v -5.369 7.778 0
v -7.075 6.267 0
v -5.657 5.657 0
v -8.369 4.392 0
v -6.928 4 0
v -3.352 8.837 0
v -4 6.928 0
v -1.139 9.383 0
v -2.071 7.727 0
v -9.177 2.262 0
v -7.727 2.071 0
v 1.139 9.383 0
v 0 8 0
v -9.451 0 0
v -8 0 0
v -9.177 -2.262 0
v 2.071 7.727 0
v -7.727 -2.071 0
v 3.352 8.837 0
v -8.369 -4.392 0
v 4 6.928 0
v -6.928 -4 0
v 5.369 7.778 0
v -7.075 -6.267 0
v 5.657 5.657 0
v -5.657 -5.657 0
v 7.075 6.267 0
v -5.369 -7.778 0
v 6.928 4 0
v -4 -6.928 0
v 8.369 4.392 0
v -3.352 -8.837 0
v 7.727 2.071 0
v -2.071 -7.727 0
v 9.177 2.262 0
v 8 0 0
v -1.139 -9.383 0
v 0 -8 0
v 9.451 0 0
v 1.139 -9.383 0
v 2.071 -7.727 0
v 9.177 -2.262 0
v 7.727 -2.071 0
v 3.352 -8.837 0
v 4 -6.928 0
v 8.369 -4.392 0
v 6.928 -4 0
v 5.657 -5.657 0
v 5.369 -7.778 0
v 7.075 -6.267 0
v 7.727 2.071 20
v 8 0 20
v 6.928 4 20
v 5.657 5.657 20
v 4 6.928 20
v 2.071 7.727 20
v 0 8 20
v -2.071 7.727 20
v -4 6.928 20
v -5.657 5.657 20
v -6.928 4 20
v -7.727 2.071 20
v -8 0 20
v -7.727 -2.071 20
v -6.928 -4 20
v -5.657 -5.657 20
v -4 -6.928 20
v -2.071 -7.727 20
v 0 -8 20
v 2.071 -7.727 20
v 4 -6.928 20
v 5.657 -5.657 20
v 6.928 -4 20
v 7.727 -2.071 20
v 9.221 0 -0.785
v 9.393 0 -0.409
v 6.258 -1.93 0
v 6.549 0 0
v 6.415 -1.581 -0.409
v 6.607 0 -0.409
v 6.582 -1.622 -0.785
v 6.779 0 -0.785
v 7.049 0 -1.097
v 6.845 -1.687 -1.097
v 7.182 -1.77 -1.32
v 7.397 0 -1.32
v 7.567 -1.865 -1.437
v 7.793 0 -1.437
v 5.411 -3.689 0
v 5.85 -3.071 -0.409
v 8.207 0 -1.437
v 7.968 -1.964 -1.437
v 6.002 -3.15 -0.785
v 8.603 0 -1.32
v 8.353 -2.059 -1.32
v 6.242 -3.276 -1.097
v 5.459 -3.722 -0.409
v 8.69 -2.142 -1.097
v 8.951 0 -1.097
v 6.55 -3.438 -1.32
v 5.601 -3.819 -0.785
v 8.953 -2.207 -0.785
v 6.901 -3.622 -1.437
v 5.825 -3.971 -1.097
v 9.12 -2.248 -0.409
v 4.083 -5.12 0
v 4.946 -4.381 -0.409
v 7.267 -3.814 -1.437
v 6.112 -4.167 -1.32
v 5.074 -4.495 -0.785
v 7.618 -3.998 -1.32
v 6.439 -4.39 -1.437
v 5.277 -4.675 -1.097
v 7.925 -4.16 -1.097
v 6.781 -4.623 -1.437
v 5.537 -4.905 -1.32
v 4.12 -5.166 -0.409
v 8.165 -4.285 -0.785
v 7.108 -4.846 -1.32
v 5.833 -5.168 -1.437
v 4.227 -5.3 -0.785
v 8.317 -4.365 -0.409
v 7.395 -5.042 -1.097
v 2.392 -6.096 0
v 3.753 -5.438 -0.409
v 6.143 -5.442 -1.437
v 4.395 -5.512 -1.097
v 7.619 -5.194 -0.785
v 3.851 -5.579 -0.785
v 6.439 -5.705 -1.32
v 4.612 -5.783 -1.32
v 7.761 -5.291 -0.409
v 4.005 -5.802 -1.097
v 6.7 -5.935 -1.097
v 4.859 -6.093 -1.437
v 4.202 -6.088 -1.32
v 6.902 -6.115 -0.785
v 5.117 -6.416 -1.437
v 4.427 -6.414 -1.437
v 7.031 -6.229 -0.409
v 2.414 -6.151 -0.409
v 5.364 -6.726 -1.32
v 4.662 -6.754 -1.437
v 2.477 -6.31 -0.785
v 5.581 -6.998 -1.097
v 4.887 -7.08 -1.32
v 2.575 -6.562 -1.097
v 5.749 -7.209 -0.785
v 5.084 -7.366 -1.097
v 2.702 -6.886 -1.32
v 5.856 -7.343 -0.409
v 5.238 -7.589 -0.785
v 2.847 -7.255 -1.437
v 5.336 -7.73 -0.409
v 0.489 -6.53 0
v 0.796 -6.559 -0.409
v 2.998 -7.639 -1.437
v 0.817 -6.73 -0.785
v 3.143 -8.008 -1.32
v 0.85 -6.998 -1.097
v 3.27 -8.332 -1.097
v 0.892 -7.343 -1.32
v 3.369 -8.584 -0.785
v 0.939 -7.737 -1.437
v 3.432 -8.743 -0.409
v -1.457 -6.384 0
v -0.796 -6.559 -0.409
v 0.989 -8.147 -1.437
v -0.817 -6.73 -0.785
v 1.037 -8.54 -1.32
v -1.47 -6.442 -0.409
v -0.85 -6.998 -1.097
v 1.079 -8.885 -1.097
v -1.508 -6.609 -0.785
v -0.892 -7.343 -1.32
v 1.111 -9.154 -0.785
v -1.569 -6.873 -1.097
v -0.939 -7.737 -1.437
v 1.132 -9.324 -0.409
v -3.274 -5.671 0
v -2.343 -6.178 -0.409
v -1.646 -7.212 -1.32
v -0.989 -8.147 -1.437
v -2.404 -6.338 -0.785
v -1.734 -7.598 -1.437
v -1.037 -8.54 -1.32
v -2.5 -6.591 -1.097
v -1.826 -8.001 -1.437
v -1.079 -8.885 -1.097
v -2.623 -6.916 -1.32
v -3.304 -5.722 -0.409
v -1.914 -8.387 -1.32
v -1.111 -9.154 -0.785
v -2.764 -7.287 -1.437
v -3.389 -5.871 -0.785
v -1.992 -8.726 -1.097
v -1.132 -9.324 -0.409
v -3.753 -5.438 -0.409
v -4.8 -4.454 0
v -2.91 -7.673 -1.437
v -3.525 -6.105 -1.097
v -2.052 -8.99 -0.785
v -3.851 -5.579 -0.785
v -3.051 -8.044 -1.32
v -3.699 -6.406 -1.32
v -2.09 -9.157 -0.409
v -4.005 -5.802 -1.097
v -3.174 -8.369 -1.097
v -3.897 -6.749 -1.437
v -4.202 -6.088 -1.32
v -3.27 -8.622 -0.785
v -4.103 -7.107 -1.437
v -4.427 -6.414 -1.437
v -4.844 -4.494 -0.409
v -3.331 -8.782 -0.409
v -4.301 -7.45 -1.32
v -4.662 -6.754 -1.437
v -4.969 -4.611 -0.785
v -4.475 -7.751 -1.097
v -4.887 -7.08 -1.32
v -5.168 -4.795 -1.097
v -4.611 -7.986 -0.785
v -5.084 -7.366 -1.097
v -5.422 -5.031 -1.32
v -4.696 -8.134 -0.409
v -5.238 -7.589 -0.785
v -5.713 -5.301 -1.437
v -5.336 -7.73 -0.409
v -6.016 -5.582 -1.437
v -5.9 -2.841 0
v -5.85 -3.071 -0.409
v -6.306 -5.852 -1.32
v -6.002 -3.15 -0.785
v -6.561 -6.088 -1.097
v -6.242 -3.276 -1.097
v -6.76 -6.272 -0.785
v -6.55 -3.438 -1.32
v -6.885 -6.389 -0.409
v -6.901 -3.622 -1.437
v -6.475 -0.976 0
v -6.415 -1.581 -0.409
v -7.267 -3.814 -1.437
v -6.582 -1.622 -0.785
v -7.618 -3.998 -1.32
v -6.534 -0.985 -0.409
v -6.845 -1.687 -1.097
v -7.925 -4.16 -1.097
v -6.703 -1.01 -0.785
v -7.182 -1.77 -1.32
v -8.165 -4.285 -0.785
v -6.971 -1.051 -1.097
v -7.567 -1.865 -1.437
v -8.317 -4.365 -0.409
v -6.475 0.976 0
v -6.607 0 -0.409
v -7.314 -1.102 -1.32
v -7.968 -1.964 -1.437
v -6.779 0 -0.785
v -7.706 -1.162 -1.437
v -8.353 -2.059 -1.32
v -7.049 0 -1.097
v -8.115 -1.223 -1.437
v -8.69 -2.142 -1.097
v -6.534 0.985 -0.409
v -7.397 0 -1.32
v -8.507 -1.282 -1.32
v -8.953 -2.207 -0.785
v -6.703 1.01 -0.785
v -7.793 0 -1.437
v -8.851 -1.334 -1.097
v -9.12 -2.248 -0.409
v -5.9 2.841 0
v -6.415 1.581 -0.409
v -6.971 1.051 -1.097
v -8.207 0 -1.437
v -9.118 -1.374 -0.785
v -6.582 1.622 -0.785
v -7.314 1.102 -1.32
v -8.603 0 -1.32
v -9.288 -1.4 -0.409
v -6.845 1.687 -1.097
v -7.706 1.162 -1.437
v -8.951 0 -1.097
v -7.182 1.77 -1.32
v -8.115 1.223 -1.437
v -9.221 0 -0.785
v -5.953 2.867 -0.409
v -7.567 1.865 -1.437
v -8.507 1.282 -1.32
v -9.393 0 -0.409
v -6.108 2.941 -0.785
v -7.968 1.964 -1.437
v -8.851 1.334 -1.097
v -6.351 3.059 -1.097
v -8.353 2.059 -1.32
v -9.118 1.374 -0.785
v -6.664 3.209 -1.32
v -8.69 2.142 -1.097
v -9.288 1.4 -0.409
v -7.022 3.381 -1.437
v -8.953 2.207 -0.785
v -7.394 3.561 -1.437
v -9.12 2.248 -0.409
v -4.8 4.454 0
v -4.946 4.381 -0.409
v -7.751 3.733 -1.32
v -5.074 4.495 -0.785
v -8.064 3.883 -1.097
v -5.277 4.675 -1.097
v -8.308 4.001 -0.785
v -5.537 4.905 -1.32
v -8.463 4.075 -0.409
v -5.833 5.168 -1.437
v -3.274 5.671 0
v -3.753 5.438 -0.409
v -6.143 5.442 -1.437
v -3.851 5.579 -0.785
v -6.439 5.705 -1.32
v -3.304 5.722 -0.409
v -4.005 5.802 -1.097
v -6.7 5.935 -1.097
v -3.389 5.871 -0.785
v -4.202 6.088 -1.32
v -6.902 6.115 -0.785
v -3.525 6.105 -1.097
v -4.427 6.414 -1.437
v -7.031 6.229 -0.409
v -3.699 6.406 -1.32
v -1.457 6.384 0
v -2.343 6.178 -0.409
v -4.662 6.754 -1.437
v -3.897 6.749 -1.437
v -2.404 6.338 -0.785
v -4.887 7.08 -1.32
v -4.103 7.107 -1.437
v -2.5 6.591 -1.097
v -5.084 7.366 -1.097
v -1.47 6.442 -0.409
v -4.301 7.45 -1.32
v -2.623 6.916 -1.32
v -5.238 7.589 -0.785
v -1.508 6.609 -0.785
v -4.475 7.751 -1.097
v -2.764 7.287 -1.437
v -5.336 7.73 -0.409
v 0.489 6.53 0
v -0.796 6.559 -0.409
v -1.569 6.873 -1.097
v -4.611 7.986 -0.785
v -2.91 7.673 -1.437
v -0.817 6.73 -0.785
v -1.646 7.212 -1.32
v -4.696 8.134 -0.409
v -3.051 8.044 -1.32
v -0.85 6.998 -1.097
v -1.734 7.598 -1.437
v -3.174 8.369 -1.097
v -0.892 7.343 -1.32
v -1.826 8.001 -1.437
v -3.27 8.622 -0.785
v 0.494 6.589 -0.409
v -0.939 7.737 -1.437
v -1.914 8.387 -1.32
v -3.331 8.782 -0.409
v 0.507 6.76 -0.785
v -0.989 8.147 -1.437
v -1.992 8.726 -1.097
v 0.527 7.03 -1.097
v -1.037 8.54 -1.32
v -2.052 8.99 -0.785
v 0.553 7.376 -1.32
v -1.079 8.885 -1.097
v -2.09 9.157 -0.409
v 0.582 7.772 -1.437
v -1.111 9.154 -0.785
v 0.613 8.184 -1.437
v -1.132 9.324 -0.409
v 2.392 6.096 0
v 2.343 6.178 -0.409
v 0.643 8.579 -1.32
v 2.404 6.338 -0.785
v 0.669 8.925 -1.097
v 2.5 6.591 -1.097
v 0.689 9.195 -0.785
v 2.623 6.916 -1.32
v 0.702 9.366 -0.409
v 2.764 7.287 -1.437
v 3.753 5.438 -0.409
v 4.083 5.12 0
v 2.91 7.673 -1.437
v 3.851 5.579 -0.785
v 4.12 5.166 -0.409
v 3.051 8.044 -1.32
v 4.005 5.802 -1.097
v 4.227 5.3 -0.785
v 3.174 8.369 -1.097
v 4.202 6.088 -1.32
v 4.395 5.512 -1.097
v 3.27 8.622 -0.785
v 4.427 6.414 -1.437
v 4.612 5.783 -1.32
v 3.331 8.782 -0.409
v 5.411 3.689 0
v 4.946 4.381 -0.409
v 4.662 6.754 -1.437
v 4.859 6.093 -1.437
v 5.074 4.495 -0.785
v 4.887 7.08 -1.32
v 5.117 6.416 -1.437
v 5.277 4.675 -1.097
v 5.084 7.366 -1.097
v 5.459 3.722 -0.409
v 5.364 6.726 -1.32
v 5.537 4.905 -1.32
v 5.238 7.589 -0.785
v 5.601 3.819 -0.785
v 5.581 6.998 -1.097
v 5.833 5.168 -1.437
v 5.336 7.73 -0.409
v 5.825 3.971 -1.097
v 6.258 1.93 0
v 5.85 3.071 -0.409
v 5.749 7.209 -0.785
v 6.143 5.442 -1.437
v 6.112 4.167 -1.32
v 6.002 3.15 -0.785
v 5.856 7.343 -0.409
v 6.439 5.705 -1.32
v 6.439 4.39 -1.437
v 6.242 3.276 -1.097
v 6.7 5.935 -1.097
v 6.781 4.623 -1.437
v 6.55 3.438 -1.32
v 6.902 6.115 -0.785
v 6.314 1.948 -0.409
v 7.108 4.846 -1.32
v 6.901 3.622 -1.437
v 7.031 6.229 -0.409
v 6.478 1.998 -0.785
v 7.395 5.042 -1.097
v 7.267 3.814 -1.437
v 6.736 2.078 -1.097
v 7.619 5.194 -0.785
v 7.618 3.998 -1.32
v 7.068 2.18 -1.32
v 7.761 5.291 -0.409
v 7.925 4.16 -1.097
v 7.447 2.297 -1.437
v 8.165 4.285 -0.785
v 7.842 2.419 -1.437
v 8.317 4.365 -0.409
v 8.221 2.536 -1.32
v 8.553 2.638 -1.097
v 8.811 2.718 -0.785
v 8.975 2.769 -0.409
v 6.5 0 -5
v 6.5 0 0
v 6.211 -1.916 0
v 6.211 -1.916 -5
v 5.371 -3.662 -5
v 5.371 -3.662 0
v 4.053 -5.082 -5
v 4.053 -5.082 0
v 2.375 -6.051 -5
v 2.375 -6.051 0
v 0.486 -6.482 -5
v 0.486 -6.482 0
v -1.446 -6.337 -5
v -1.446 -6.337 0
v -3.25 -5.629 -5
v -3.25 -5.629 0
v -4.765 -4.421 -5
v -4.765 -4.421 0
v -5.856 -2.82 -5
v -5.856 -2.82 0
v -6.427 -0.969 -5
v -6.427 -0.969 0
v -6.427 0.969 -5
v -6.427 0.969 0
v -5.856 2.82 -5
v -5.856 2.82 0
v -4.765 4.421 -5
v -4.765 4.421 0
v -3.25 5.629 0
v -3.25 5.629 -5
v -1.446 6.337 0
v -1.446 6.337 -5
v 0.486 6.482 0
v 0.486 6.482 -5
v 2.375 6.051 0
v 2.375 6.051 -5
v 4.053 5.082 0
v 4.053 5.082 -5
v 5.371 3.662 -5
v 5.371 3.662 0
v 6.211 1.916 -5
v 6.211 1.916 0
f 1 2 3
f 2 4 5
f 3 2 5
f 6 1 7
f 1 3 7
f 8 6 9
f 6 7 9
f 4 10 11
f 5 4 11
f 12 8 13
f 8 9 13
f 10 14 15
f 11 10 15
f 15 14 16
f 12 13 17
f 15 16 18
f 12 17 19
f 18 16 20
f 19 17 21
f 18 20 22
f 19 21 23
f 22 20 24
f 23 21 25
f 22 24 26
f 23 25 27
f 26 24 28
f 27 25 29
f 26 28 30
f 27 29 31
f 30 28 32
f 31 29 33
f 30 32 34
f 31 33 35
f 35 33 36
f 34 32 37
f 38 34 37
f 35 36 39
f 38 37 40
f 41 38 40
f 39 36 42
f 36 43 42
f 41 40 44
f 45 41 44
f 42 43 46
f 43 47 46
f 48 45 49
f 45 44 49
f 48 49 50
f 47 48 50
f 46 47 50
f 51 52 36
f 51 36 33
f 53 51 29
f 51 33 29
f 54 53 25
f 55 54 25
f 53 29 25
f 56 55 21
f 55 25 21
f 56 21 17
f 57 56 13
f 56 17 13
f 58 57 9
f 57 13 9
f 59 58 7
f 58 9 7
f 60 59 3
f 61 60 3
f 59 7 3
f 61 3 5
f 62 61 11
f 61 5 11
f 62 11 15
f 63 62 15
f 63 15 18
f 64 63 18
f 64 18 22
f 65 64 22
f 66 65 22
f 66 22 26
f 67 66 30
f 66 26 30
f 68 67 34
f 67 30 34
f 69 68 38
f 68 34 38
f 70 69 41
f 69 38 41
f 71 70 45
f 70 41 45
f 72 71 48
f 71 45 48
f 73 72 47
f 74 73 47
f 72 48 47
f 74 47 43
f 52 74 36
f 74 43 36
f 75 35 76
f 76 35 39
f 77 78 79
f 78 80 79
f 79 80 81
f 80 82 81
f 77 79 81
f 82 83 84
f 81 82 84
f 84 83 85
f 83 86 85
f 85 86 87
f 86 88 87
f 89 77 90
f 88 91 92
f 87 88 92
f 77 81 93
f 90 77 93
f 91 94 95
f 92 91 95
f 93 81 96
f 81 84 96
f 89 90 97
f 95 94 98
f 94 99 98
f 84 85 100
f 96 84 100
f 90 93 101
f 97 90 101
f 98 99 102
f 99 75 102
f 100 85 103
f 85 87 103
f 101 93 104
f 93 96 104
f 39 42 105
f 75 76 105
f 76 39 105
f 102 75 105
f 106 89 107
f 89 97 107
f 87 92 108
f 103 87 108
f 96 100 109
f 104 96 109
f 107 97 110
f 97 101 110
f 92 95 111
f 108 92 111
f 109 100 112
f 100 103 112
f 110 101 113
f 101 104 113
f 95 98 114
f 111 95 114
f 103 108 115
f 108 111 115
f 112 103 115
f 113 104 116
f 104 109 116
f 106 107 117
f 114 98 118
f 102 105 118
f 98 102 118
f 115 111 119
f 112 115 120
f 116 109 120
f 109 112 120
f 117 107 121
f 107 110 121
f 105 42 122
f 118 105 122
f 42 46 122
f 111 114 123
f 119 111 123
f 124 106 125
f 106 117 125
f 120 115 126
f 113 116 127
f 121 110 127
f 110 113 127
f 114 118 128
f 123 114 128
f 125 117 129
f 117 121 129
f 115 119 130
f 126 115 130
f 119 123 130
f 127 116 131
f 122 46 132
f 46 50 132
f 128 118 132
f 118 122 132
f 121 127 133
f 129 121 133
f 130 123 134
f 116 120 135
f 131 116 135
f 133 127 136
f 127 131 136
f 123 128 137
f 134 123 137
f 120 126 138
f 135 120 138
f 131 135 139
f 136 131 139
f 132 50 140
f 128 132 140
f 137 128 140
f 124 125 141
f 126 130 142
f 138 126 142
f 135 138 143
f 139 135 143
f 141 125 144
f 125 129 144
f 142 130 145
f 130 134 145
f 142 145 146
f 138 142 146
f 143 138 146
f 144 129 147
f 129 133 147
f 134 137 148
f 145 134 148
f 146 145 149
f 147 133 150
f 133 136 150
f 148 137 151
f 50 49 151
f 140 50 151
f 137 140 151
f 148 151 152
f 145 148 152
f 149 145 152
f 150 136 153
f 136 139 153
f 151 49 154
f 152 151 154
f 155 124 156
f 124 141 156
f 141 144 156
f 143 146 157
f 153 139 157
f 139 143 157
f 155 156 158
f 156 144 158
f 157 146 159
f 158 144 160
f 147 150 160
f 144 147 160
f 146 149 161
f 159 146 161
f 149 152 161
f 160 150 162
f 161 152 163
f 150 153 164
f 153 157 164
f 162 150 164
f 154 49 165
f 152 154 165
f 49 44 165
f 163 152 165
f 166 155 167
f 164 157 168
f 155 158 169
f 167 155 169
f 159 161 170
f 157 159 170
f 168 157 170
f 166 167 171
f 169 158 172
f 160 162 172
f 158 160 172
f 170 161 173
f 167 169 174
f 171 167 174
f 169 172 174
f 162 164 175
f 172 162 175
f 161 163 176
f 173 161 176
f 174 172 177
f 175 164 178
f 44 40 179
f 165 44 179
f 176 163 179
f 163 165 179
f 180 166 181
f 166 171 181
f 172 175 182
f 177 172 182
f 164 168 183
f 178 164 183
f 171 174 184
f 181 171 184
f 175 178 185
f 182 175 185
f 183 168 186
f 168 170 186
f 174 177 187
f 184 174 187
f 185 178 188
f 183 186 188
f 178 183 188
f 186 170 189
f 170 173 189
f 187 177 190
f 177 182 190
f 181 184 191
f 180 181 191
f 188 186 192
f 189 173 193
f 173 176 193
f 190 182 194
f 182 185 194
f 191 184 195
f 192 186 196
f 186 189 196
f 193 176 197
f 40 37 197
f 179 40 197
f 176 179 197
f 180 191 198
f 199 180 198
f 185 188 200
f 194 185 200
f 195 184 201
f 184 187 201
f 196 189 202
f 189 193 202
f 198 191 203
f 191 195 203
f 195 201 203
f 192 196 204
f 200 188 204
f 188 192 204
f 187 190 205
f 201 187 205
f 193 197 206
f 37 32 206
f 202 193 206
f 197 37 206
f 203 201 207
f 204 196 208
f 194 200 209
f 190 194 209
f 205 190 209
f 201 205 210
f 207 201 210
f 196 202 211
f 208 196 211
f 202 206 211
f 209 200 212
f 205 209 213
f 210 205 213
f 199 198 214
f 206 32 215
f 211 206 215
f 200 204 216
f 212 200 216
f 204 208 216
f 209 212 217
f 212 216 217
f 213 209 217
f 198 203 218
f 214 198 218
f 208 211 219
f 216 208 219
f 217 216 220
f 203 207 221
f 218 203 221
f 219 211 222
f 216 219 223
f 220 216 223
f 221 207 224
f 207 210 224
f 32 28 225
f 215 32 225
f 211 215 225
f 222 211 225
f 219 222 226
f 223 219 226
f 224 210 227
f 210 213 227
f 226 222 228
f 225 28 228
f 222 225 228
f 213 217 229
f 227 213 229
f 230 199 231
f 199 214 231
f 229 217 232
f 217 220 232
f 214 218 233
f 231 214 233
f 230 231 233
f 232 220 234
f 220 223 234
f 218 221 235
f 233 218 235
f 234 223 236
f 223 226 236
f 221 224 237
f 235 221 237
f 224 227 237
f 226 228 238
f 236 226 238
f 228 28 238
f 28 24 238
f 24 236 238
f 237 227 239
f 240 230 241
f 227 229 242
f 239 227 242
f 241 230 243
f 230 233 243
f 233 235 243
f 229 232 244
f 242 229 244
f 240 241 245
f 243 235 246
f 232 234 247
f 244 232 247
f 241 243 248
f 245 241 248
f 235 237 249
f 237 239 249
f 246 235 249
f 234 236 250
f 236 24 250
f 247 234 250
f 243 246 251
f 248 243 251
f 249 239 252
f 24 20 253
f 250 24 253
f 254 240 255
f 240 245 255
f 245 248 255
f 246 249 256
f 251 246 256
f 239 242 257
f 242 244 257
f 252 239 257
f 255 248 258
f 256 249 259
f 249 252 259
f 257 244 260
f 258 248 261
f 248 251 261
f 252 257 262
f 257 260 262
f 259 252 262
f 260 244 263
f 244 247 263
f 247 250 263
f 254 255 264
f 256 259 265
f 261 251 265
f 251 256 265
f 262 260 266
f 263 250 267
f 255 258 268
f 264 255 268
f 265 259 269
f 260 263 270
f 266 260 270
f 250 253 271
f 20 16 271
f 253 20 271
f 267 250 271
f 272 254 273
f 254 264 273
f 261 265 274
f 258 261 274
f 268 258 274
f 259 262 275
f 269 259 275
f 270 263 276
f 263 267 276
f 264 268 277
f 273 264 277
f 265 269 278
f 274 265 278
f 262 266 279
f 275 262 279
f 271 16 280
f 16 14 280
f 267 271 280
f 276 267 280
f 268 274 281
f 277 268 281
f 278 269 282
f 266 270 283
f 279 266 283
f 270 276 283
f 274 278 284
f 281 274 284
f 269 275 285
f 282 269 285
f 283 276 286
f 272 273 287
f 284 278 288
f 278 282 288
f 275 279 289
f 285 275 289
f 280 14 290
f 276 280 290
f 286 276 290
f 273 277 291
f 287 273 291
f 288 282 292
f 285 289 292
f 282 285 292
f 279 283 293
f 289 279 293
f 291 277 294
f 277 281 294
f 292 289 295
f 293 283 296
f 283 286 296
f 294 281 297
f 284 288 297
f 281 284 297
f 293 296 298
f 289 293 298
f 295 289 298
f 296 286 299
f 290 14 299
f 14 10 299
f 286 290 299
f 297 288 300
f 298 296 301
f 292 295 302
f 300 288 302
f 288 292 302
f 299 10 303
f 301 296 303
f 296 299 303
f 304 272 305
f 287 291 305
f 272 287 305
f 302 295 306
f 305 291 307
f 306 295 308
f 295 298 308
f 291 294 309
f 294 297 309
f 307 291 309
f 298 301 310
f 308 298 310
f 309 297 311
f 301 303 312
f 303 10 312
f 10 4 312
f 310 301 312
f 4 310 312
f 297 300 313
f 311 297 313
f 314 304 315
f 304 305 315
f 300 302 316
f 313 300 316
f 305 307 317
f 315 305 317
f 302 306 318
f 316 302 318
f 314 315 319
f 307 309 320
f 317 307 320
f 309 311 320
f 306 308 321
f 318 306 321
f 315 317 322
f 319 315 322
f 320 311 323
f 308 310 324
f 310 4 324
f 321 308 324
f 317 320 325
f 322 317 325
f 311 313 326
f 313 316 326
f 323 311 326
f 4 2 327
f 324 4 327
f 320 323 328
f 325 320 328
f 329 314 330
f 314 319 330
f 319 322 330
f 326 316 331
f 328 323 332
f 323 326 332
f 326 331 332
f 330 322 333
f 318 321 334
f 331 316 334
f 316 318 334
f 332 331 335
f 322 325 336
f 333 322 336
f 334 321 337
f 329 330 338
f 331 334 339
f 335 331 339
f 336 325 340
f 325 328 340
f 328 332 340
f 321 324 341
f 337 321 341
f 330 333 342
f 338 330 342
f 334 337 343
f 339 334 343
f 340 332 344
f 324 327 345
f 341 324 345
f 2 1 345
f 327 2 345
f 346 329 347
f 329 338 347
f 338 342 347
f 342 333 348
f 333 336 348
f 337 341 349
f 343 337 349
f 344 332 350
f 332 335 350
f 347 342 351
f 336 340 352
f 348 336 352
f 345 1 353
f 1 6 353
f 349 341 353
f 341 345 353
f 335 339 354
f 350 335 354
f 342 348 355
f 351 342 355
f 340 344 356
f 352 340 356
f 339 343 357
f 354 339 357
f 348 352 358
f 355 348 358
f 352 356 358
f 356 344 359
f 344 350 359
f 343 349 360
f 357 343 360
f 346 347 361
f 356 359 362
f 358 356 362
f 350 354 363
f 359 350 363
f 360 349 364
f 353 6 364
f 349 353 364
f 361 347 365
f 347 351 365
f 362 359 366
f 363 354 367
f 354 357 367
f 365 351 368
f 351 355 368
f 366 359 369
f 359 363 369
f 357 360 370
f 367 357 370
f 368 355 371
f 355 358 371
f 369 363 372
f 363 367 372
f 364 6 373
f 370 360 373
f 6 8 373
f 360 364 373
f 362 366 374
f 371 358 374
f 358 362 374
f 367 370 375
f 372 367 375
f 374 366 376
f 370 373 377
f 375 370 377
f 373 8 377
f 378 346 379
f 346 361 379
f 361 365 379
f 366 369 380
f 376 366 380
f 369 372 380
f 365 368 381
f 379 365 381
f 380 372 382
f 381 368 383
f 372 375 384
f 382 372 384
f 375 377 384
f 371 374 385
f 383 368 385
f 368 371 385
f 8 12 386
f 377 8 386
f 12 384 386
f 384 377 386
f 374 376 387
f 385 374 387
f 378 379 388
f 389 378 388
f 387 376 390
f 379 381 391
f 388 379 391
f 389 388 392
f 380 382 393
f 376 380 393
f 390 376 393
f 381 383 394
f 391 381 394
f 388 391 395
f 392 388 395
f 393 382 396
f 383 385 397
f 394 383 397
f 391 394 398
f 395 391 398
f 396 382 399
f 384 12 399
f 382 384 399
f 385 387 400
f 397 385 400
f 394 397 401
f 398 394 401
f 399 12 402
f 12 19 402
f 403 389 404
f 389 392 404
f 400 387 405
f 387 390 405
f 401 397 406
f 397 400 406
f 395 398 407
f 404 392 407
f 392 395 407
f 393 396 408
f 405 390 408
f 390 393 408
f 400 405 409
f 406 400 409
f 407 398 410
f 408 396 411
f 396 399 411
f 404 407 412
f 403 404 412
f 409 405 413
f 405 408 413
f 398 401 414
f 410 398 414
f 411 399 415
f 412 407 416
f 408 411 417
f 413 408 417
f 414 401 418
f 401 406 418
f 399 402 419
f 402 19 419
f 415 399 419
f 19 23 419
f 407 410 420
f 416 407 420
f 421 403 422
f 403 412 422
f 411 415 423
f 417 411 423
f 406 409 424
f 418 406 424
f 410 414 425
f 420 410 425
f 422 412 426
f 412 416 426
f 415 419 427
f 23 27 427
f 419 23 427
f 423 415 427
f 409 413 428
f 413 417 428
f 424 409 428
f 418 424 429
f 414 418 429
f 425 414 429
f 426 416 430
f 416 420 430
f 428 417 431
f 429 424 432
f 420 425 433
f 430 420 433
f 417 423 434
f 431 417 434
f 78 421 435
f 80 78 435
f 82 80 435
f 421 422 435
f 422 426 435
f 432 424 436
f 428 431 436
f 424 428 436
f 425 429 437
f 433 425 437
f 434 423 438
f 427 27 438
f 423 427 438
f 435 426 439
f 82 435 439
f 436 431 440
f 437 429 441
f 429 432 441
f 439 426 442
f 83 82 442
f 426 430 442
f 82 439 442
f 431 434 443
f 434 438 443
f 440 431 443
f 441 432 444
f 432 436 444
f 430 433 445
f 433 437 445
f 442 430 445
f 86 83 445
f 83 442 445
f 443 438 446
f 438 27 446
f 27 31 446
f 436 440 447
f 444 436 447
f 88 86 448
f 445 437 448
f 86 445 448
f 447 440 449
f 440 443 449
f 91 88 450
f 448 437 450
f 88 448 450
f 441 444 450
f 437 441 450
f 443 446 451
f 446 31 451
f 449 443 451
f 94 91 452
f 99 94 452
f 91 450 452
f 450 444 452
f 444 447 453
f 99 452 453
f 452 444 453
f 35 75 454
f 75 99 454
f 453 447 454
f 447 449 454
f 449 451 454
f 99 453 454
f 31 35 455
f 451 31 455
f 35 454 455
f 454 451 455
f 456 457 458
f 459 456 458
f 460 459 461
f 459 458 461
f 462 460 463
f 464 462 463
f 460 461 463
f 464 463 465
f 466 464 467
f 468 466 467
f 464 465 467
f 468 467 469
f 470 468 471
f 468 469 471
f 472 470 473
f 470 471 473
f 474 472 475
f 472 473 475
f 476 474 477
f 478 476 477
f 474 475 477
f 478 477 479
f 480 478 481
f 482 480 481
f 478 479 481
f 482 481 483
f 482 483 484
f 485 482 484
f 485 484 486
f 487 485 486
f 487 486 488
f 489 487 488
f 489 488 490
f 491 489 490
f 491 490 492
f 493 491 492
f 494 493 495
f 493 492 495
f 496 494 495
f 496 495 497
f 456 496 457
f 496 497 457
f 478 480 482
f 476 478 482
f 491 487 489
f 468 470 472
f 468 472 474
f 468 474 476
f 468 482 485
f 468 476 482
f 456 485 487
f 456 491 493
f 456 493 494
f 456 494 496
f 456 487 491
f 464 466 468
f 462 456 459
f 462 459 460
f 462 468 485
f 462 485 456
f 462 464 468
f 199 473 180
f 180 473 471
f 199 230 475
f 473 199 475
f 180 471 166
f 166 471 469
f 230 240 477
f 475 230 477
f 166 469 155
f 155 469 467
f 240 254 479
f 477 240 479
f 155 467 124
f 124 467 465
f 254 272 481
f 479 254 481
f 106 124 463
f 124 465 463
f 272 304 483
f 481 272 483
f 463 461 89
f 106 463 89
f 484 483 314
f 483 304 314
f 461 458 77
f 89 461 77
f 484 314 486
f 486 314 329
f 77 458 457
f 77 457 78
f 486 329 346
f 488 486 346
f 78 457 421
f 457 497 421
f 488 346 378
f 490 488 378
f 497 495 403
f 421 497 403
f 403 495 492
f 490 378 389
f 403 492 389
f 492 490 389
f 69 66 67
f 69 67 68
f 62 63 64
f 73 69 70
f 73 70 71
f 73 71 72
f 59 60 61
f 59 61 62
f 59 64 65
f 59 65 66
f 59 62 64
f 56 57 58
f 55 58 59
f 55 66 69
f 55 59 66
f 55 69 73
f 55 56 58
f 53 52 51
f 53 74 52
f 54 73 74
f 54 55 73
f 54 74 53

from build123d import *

# Parameters (mm, degrees)
SKETCH1_R           = 8
BOSS_EXTRUDE1_DEPTH = 20
SKETCH3_R           = 6.5
BOSS_EXTRUDE2_DEPTH = 5


with BuildPart() as part:
    # Sketch1 → Boss-Extrude1 (new body)
    with BuildSketch(Plane.XY):
        Circle(SKETCH1_R)
    extrude(amount=BOSS_EXTRUDE1_DEPTH)

    # Sketch2 → Revolve1 (revolve)
    with BuildSketch(Plane(origin=(0, 0, 0), x_dir=(1, 0, 0), z_dir=(0, 1, 0))):
        with BuildLine():
            Line((9.451478866, 0), (6.548521134, 0))
            ThreePointArc((6.548521134, 0), (8, 1.451478866), (9.451478866, 0))
        make_face()
    revolve(axis=Axis((0, 0, 0), (0, 0, -1)))

    # Sketch3 → Boss-Extrude2 (add)
    with BuildSketch(Plane(origin=(0, 0, 0), x_dir=(-1, 0, 0), z_dir=(0, 0, -1))):
        with Locations(Location((0, 0, 0), (0, 0, 180))):
            Circle(SKETCH3_R)
    extrude(amount=BOSS_EXTRUDE2_DEPTH)


solid = part.part
